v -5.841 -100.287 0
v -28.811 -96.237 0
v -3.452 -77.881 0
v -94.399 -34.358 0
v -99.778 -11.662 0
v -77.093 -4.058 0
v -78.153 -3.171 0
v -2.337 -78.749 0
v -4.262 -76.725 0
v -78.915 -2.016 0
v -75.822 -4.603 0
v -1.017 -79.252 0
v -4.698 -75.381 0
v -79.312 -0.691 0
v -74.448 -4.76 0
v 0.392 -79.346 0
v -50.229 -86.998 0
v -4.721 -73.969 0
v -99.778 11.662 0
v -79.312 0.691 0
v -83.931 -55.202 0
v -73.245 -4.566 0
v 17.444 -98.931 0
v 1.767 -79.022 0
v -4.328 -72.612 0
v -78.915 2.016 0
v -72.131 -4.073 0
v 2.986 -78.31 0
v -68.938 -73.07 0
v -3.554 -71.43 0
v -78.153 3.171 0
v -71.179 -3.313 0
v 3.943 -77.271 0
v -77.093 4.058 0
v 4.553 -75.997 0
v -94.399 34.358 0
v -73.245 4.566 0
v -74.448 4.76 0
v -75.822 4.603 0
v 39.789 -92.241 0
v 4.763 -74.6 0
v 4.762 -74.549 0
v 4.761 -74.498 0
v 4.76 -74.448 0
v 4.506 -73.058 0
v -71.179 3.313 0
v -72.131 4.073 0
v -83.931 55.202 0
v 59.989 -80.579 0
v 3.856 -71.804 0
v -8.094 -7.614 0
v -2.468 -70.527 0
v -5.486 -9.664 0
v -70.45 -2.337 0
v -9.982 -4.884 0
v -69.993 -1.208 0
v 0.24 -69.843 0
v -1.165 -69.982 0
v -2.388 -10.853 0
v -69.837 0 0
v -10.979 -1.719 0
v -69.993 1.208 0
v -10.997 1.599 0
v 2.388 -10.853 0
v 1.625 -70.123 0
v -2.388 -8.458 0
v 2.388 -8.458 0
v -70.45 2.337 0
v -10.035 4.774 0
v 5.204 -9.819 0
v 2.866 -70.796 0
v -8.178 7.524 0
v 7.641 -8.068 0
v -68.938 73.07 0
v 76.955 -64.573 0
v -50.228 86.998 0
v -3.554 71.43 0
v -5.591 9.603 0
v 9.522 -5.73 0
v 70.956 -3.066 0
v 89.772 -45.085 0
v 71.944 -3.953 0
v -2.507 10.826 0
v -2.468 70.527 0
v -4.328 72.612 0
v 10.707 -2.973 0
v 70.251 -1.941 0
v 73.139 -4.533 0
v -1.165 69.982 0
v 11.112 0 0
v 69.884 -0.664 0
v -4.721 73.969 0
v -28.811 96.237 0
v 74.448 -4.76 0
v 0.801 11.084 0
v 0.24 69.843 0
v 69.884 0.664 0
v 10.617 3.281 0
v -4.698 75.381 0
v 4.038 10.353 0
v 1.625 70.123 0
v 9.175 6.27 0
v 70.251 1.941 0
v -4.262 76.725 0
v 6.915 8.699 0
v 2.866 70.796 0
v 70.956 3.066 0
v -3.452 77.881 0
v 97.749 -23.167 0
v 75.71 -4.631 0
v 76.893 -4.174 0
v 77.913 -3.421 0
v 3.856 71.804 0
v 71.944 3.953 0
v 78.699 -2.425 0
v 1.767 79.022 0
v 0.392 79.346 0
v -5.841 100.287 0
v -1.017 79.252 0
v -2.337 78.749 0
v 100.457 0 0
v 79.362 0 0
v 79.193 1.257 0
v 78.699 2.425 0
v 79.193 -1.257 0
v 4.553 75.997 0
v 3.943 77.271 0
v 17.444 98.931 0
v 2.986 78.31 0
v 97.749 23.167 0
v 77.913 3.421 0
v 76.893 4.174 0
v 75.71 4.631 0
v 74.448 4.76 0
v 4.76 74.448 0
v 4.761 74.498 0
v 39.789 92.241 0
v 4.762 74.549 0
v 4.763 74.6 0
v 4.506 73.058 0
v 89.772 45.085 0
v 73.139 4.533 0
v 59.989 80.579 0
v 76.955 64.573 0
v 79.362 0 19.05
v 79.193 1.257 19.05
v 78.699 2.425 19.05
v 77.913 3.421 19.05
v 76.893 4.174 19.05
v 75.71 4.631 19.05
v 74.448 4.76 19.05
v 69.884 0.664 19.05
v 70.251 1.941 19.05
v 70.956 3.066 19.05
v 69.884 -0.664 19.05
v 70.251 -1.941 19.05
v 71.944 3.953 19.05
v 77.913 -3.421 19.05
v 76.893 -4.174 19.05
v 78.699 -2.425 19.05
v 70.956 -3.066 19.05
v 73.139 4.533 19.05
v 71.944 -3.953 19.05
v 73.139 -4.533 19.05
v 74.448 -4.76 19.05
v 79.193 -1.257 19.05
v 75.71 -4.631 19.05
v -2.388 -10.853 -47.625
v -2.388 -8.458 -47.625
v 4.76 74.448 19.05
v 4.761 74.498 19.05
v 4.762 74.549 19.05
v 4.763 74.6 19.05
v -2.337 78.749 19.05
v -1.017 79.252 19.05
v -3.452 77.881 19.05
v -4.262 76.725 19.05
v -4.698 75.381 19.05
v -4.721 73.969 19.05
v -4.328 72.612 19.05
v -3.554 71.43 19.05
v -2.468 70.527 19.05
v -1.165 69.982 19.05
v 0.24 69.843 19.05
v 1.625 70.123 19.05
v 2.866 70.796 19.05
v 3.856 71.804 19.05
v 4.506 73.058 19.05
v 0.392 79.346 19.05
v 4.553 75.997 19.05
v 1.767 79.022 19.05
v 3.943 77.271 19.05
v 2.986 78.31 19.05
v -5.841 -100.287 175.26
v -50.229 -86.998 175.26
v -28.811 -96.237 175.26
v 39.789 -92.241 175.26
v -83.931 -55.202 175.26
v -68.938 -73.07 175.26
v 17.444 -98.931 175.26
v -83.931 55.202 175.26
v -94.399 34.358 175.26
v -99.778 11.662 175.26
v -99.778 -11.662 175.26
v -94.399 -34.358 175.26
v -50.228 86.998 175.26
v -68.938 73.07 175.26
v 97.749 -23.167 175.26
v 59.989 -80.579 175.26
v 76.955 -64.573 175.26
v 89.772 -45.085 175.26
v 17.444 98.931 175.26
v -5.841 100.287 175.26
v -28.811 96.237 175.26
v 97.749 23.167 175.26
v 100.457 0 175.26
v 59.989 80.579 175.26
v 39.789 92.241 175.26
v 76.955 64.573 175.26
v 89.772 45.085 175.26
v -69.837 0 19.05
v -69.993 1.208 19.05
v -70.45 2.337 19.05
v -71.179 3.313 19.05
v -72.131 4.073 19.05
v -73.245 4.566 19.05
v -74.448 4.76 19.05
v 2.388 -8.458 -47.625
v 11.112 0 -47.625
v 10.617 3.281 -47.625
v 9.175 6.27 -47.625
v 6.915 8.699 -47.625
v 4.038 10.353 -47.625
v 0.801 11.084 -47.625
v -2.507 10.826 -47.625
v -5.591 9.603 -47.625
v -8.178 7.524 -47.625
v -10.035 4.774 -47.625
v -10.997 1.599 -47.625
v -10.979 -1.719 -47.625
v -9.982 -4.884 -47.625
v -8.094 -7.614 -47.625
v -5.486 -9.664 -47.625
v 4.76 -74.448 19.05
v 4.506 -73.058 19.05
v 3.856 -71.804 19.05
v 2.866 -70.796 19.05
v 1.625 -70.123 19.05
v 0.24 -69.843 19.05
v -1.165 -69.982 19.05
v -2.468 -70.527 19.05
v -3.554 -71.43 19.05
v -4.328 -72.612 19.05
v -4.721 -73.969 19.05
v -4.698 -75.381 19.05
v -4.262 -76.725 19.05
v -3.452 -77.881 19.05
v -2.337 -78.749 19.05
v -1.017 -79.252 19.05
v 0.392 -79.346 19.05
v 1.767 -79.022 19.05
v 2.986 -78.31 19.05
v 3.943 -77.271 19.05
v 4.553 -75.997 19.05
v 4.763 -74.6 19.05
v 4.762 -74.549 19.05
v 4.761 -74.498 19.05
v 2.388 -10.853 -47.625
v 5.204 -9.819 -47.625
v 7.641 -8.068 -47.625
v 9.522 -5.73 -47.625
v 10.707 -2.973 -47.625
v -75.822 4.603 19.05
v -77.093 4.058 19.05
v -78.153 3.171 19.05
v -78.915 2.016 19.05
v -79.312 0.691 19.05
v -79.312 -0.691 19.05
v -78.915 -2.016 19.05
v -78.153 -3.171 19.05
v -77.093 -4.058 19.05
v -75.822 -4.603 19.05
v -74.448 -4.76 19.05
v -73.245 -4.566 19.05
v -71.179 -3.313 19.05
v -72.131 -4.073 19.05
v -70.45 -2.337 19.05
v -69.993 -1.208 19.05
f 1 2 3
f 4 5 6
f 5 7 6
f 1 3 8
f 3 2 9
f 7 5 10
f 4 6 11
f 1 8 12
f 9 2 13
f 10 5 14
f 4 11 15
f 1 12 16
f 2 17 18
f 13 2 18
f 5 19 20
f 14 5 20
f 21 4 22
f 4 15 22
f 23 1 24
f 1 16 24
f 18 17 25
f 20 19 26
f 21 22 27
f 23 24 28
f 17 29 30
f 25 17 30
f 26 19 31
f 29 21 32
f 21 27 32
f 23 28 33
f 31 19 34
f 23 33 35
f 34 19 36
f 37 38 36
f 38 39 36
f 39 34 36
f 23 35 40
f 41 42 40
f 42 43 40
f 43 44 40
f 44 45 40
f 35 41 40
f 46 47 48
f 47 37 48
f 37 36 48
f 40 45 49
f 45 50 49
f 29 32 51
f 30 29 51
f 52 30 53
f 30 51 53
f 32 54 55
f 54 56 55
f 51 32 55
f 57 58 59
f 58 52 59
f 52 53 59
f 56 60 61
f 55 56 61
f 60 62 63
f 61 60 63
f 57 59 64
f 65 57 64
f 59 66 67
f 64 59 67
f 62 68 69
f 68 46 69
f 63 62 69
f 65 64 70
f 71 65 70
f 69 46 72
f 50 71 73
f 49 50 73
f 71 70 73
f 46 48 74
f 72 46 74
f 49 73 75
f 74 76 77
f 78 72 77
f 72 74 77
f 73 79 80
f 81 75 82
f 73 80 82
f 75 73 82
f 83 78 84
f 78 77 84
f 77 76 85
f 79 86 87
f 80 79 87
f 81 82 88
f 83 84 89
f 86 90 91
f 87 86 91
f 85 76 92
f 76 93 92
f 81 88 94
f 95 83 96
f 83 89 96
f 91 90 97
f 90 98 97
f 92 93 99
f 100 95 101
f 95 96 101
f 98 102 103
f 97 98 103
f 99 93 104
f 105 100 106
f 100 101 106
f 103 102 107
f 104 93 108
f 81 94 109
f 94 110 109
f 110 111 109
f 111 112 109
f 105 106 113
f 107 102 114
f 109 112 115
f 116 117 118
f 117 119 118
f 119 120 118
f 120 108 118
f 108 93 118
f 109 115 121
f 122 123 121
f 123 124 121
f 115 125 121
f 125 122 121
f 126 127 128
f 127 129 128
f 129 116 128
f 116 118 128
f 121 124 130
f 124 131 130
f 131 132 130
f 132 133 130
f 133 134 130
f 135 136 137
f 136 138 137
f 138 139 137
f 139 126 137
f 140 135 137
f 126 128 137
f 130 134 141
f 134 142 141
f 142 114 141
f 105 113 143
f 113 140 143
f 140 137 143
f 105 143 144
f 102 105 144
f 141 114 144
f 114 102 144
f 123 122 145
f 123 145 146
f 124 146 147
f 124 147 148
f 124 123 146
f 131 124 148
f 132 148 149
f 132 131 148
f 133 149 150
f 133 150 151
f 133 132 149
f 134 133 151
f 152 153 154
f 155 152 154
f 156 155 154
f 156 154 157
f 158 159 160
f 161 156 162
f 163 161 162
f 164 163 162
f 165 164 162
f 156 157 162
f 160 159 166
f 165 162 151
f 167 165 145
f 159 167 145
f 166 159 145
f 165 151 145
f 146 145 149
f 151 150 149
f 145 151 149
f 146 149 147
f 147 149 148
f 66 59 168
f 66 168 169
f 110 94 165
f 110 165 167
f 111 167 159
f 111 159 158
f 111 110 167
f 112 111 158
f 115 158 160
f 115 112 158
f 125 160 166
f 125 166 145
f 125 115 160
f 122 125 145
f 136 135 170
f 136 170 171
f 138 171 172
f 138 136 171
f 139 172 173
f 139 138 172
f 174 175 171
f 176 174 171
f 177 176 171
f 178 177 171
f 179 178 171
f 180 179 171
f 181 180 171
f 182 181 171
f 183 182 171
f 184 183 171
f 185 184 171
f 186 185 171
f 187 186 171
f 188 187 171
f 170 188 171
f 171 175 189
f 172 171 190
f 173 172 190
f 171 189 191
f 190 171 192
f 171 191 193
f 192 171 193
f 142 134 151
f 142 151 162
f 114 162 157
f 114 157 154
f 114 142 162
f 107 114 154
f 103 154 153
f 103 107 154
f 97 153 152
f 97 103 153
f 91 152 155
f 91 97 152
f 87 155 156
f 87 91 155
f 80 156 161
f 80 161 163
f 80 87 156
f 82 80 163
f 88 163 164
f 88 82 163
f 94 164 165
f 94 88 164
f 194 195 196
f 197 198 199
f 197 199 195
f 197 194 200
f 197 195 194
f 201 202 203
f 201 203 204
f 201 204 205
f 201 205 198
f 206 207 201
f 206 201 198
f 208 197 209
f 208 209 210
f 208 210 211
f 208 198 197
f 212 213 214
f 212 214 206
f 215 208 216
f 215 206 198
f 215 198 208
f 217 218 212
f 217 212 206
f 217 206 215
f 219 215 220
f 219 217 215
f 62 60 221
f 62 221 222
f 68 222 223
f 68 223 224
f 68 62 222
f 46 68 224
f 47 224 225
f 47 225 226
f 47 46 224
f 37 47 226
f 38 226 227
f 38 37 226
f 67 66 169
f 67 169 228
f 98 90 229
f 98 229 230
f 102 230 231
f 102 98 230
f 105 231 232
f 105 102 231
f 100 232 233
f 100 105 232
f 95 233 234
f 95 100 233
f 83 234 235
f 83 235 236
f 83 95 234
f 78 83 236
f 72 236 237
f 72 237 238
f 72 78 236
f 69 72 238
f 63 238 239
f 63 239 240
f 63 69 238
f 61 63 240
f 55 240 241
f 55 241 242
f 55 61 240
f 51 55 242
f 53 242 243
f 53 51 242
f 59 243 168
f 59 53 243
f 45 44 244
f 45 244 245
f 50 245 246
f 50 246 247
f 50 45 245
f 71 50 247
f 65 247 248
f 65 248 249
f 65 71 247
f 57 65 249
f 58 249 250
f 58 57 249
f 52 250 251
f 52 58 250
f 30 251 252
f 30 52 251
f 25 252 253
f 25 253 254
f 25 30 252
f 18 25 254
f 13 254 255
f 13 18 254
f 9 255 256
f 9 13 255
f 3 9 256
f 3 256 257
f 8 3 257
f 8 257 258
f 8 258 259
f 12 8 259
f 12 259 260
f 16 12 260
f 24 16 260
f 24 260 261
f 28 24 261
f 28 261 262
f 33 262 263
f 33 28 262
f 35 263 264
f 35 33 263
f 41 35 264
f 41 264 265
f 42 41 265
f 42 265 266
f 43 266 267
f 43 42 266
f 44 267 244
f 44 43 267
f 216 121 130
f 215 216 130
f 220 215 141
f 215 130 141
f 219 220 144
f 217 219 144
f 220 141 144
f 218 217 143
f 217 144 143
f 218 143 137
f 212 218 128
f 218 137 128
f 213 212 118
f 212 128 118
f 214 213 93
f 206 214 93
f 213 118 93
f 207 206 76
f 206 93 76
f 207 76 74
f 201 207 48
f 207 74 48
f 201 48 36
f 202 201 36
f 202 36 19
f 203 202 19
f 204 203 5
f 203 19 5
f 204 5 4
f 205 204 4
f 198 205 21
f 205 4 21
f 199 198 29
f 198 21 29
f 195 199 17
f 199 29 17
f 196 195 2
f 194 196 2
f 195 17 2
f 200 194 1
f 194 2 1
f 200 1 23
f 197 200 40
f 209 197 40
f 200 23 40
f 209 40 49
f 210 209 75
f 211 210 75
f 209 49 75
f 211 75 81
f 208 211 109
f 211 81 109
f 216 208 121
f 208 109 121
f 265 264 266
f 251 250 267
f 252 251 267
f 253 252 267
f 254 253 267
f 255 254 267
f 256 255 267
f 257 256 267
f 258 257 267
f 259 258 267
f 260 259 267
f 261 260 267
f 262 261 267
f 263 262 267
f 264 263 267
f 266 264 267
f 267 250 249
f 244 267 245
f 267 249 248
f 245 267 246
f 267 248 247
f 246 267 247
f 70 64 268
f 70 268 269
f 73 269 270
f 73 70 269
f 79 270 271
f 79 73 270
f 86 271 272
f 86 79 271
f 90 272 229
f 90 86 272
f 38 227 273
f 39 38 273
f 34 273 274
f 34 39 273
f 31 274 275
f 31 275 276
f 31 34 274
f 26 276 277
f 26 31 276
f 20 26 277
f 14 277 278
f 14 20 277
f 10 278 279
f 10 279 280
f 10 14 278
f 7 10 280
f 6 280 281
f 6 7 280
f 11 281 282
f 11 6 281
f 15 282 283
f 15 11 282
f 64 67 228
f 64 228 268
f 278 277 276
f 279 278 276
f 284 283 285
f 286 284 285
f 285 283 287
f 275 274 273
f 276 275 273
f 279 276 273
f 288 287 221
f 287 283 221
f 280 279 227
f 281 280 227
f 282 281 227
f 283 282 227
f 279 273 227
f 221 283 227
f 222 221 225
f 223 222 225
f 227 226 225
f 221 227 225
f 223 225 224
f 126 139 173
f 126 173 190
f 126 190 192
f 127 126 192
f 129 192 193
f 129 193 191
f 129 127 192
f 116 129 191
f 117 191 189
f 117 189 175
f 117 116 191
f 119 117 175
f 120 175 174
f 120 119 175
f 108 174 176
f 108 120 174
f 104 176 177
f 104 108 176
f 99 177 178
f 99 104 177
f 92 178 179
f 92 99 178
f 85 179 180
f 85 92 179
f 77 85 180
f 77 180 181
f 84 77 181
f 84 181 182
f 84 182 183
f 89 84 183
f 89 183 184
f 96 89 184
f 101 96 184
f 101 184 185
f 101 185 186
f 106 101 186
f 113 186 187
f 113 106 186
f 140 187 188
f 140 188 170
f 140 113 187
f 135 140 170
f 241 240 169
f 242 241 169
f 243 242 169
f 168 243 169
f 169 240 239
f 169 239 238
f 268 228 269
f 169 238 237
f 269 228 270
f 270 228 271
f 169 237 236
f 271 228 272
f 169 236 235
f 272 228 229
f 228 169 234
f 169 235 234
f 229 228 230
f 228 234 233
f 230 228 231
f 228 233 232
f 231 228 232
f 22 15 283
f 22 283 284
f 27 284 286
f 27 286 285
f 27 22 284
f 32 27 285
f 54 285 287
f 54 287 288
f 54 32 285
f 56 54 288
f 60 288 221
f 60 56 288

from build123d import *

# Parameters (mm, degrees)
F0_R     = 100.457
F1_DEPTH = 175.26
F2_DEPTH = 19.05
F4_DEPTH = 47.625


with BuildPart() as f1:
    # F0 (on Top) → F1 (new body)
    with BuildSketch(Plane.XY):
        Circle(F0_R)
        with BuildLine():
            ThreePointArc((4.7600731087, 74.4477794433), (52.7500244552, 52.7500244552), (74.4477794433, 4.7600731087))
            ThreePointArc((74.4477794433, 4.7600731087), (77.9132127685, 3.420921232), (79.3623, 0))
            ThreePointArc((79.3623, 0), (77.9132127685, -3.420921232), (74.4477794433, -4.7600731087))
            ThreePointArc((74.4477794433, -4.7600731087), (52.7500244552, -52.7500244552), (4.7600731087, -74.4477794433))
            ThreePointArc((4.7600731087, -74.4477794433), (4.7618932385, -74.5237800364), (4.7625, -74.5998))
            ThreePointArc((4.7625, -74.5998), (-0.0760199636, -79.3616932385), (-4.7600731087, -74.4477794433))
            ThreePointArc((-4.7600731087, -74.4477794433), (-52.7500244552, -52.7500244552), (-74.4477794433, -4.7600731087))
            ThreePointArc((-74.4477794433, -4.7600731087), (-79.3623, 0), (-74.4477794433, 4.7600731087))
            ThreePointArc((-74.4477794433, 4.7600731087), (-52.7500244552, 52.7500244552), (-4.7600731087, 74.4477794433))
            ThreePointArc((-4.7600731087, 74.4477794433), (-0.0760199636, 79.3616932385), (4.7625, 74.5998))
            ThreePointArc((4.7625, 74.5998), (4.7618932385, 74.5237800364), (4.7600731087, 74.4477794433))
        make_face(mode=Mode.SUBTRACT)
        with BuildLine():
            ThreePointArc((-74.4477794433, -4.7600731087), (-74.5998, 0), (-74.4477794433, 4.7600731087))
            ThreePointArc((-74.4477794433, 4.7600731087), (-79.3623, 0), (-74.4477794433, -4.7600731087))
        make_face()
        with BuildLine():
            ThreePointArc((-69.8373, 0), (-71.178878768, 3.3134127685), (-74.4477794433, 4.7600731087))
            ThreePointArc((-74.4477794433, 4.7600731087), (-74.5998, 0), (-74.4477794433, -4.7600731087))
            ThreePointArc((-74.4477794433, -4.7600731087), (-71.178878768, -3.3134127685), (-69.8373, 0))
        make_face()
        with BuildLine():
            ThreePointArc((-4.7600731087, 74.4477794433), (0, 74.5998), (4.7600731087, 74.4477794433))
            ThreePointArc((4.7600731087, 74.4477794433), (4.7618932385, 74.5237800364), (4.7625, 74.5998))
            ThreePointArc((4.7625, 74.5998), (-0.0760199636, 79.3616932385), (-4.7600731087, 74.4477794433))
        make_face()
        with BuildLine():
            ThreePointArc((-4.7600731087, 74.4477794433), (0, 69.8373), (4.7600731087, 74.4477794433))
            ThreePointArc((4.7600731087, 74.4477794433), (0, 74.5998), (-4.7600731087, 74.4477794433))
        make_face()
        with BuildLine():
            ThreePointArc((74.4477794433, -4.7600731087), (74.561785175, -2.38125), (74.5998, 0))
            ThreePointArc((74.5998, 0), (74.561785175, 2.38125), (74.4477794433, 4.7600731087))
            ThreePointArc((74.4477794433, 4.7600731087), (69.8373, 0), (74.4477794433, -4.7600731087))
        make_face()
        with BuildLine():
            ThreePointArc((74.4477794433, 4.7600731087), (74.561785175, 2.38125), (74.5998, 0))
            ThreePointArc((74.5998, 0), (74.561785175, -2.38125), (74.4477794433, -4.7600731087))
            ThreePointArc((74.4477794433, -4.7600731087), (77.9132127685, -3.420921232), (79.3623, 0))
            ThreePointArc((79.3623, 0), (77.9132127685, 3.420921232), (74.4477794433, 4.7600731087))
        make_face()
        with BuildLine():
            ThreePointArc((4.7625, -74.5998), (4.7618932385, -74.5237800364), (4.7600731087, -74.4477794433))
            ThreePointArc((4.7600731087, -74.4477794433), (0, -74.5998), (-4.7600731087, -74.4477794433))
            ThreePointArc((-4.7600731087, -74.4477794433), (-0.0760199636, -79.3616932385), (4.7625, -74.5998))
        make_face()
        with BuildLine():
            ThreePointArc((74.4477794433, -4.7600731087), (69.8373, 0), (74.4477794433, 4.7600731087))
            ThreePointArc((74.4477794433, 4.7600731087), (52.7500244552, 52.7500244552), (4.7600731087, 74.4477794433))
            ThreePointArc((4.7600731087, 74.4477794433), (0, 69.8373), (-4.7600731087, 74.4477794433))
            ThreePointArc((-4.7600731087, 74.4477794433), (-52.7500244552, 52.7500244552), (-74.4477794433, 4.7600731087))
            ThreePointArc((-74.4477794433, 4.7600731087), (-71.178878768, 3.3134127685), (-69.8373, 0))
            ThreePointArc((-69.8373, 0), (-71.178878768, -3.3134127685), (-74.4477794433, -4.7600731087))
            ThreePointArc((-74.4477794433, -4.7600731087), (-52.7500244552, -52.7500244552), (-4.7600731087, -74.4477794433))
            ThreePointArc((-4.7600731087, -74.4477794433), (0, -69.8373), (4.7600731087, -74.4477794433))
            ThreePointArc((4.7600731087, -74.4477794433), (52.7500244552, -52.7500244552), (74.4477794433, -4.7600731087))
        make_face()
        with BuildLine():
            ThreePointArc((-4.7600731087, -74.4477794433), (0, -74.5998), (4.7600731087, -74.4477794433))
            ThreePointArc((4.7600731087, -74.4477794433), (0, -69.8373), (-4.7600731087, -74.4477794433))
        make_face()
    extrude(amount=F1_DEPTH)

    # F0 (on Top) → F2 (cut)
    with BuildSketch(Plane.XY):
        with BuildLine():
            ThreePointArc((-69.8373, 0), (-71.178878768, 3.3134127685), (-74.4477794433, 4.7600731087))
            ThreePointArc((-74.4477794433, 4.7600731087), (-74.5998, 0), (-74.4477794433, -4.7600731087))
            ThreePointArc((-74.4477794433, -4.7600731087), (-71.178878768, -3.3134127685), (-69.8373, 0))
        make_face()
        with BuildLine():
            ThreePointArc((-74.4477794433, -4.7600731087), (-74.5998, 0), (-74.4477794433, 4.7600731087))
            ThreePointArc((-74.4477794433, 4.7600731087), (-79.3623, 0), (-74.4477794433, -4.7600731087))
        make_face()
        with BuildLine():
            ThreePointArc((-4.7600731087, 74.4477794433), (0, 69.8373), (4.7600731087, 74.4477794433))
            ThreePointArc((4.7600731087, 74.4477794433), (0, 74.5998), (-4.7600731087, 74.4477794433))
        make_face()
        with BuildLine():
            ThreePointArc((-4.7600731087, 74.4477794433), (0, 74.5998), (4.7600731087, 74.4477794433))
            ThreePointArc((4.7600731087, 74.4477794433), (4.7618932385, 74.5237800364), (4.7625, 74.5998))
            ThreePointArc((4.7625, 74.5998), (-0.0760199636, 79.3616932385), (-4.7600731087, 74.4477794433))
        make_face()
        with BuildLine():
            ThreePointArc((74.4477794433, -4.7600731087), (74.561785175, -2.38125), (74.5998, 0))
            ThreePointArc((74.5998, 0), (74.561785175, 2.38125), (74.4477794433, 4.7600731087))
            ThreePointArc((74.4477794433, 4.7600731087), (69.8373, 0), (74.4477794433, -4.7600731087))
        make_face()
        with BuildLine():
            ThreePointArc((74.4477794433, 4.7600731087), (74.561785175, 2.38125), (74.5998, 0))
            ThreePointArc((74.5998, 0), (74.561785175, -2.38125), (74.4477794433, -4.7600731087))
            ThreePointArc((74.4477794433, -4.7600731087), (77.9132127685, -3.420921232), (79.3623, 0))
            ThreePointArc((79.3623, 0), (77.9132127685, 3.420921232), (74.4477794433, 4.7600731087))
        make_face()
        with BuildLine():
            ThreePointArc((4.7625, -74.5998), (4.7618932385, -74.5237800364), (4.7600731087, -74.4477794433))
            ThreePointArc((4.7600731087, -74.4477794433), (0, -74.5998), (-4.7600731087, -74.4477794433))
            ThreePointArc((-4.7600731087, -74.4477794433), (-0.0760199636, -79.3616932385), (4.7625, -74.5998))
        make_face()
        with BuildLine():
            ThreePointArc((-4.7600731087, -74.4477794433), (0, -74.5998), (4.7600731087, -74.4477794433))
            ThreePointArc((4.7600731087, -74.4477794433), (0, -69.8373), (-4.7600731087, -74.4477794433))
        make_face()
    extrude(amount=F2_DEPTH, mode=Mode.SUBTRACT)

    # F3 (on face) → F4 (join)
    with BuildSketch(Plane.XY):
        with BuildLine():
            ThreePointArc((2.3876, -10.8529729793), (8.6608273638, -6.962594748), (11.1125, 0))
            ThreePointArc((11.1125, 0), (-6.962594748, 8.6608273638), (-2.3876, -10.8529729793))
            Line((-2.3876, -10.8529729793), (-2.3876, -8.4582))
            Line((-2.3876, -8.4582), (2.3876, -8.4582))
            Line((2.3876, -8.4582), (2.3876, -10.8529729793))
        make_face()
    extrude(amount=-F4_DEPTH)


solid = f1.part
